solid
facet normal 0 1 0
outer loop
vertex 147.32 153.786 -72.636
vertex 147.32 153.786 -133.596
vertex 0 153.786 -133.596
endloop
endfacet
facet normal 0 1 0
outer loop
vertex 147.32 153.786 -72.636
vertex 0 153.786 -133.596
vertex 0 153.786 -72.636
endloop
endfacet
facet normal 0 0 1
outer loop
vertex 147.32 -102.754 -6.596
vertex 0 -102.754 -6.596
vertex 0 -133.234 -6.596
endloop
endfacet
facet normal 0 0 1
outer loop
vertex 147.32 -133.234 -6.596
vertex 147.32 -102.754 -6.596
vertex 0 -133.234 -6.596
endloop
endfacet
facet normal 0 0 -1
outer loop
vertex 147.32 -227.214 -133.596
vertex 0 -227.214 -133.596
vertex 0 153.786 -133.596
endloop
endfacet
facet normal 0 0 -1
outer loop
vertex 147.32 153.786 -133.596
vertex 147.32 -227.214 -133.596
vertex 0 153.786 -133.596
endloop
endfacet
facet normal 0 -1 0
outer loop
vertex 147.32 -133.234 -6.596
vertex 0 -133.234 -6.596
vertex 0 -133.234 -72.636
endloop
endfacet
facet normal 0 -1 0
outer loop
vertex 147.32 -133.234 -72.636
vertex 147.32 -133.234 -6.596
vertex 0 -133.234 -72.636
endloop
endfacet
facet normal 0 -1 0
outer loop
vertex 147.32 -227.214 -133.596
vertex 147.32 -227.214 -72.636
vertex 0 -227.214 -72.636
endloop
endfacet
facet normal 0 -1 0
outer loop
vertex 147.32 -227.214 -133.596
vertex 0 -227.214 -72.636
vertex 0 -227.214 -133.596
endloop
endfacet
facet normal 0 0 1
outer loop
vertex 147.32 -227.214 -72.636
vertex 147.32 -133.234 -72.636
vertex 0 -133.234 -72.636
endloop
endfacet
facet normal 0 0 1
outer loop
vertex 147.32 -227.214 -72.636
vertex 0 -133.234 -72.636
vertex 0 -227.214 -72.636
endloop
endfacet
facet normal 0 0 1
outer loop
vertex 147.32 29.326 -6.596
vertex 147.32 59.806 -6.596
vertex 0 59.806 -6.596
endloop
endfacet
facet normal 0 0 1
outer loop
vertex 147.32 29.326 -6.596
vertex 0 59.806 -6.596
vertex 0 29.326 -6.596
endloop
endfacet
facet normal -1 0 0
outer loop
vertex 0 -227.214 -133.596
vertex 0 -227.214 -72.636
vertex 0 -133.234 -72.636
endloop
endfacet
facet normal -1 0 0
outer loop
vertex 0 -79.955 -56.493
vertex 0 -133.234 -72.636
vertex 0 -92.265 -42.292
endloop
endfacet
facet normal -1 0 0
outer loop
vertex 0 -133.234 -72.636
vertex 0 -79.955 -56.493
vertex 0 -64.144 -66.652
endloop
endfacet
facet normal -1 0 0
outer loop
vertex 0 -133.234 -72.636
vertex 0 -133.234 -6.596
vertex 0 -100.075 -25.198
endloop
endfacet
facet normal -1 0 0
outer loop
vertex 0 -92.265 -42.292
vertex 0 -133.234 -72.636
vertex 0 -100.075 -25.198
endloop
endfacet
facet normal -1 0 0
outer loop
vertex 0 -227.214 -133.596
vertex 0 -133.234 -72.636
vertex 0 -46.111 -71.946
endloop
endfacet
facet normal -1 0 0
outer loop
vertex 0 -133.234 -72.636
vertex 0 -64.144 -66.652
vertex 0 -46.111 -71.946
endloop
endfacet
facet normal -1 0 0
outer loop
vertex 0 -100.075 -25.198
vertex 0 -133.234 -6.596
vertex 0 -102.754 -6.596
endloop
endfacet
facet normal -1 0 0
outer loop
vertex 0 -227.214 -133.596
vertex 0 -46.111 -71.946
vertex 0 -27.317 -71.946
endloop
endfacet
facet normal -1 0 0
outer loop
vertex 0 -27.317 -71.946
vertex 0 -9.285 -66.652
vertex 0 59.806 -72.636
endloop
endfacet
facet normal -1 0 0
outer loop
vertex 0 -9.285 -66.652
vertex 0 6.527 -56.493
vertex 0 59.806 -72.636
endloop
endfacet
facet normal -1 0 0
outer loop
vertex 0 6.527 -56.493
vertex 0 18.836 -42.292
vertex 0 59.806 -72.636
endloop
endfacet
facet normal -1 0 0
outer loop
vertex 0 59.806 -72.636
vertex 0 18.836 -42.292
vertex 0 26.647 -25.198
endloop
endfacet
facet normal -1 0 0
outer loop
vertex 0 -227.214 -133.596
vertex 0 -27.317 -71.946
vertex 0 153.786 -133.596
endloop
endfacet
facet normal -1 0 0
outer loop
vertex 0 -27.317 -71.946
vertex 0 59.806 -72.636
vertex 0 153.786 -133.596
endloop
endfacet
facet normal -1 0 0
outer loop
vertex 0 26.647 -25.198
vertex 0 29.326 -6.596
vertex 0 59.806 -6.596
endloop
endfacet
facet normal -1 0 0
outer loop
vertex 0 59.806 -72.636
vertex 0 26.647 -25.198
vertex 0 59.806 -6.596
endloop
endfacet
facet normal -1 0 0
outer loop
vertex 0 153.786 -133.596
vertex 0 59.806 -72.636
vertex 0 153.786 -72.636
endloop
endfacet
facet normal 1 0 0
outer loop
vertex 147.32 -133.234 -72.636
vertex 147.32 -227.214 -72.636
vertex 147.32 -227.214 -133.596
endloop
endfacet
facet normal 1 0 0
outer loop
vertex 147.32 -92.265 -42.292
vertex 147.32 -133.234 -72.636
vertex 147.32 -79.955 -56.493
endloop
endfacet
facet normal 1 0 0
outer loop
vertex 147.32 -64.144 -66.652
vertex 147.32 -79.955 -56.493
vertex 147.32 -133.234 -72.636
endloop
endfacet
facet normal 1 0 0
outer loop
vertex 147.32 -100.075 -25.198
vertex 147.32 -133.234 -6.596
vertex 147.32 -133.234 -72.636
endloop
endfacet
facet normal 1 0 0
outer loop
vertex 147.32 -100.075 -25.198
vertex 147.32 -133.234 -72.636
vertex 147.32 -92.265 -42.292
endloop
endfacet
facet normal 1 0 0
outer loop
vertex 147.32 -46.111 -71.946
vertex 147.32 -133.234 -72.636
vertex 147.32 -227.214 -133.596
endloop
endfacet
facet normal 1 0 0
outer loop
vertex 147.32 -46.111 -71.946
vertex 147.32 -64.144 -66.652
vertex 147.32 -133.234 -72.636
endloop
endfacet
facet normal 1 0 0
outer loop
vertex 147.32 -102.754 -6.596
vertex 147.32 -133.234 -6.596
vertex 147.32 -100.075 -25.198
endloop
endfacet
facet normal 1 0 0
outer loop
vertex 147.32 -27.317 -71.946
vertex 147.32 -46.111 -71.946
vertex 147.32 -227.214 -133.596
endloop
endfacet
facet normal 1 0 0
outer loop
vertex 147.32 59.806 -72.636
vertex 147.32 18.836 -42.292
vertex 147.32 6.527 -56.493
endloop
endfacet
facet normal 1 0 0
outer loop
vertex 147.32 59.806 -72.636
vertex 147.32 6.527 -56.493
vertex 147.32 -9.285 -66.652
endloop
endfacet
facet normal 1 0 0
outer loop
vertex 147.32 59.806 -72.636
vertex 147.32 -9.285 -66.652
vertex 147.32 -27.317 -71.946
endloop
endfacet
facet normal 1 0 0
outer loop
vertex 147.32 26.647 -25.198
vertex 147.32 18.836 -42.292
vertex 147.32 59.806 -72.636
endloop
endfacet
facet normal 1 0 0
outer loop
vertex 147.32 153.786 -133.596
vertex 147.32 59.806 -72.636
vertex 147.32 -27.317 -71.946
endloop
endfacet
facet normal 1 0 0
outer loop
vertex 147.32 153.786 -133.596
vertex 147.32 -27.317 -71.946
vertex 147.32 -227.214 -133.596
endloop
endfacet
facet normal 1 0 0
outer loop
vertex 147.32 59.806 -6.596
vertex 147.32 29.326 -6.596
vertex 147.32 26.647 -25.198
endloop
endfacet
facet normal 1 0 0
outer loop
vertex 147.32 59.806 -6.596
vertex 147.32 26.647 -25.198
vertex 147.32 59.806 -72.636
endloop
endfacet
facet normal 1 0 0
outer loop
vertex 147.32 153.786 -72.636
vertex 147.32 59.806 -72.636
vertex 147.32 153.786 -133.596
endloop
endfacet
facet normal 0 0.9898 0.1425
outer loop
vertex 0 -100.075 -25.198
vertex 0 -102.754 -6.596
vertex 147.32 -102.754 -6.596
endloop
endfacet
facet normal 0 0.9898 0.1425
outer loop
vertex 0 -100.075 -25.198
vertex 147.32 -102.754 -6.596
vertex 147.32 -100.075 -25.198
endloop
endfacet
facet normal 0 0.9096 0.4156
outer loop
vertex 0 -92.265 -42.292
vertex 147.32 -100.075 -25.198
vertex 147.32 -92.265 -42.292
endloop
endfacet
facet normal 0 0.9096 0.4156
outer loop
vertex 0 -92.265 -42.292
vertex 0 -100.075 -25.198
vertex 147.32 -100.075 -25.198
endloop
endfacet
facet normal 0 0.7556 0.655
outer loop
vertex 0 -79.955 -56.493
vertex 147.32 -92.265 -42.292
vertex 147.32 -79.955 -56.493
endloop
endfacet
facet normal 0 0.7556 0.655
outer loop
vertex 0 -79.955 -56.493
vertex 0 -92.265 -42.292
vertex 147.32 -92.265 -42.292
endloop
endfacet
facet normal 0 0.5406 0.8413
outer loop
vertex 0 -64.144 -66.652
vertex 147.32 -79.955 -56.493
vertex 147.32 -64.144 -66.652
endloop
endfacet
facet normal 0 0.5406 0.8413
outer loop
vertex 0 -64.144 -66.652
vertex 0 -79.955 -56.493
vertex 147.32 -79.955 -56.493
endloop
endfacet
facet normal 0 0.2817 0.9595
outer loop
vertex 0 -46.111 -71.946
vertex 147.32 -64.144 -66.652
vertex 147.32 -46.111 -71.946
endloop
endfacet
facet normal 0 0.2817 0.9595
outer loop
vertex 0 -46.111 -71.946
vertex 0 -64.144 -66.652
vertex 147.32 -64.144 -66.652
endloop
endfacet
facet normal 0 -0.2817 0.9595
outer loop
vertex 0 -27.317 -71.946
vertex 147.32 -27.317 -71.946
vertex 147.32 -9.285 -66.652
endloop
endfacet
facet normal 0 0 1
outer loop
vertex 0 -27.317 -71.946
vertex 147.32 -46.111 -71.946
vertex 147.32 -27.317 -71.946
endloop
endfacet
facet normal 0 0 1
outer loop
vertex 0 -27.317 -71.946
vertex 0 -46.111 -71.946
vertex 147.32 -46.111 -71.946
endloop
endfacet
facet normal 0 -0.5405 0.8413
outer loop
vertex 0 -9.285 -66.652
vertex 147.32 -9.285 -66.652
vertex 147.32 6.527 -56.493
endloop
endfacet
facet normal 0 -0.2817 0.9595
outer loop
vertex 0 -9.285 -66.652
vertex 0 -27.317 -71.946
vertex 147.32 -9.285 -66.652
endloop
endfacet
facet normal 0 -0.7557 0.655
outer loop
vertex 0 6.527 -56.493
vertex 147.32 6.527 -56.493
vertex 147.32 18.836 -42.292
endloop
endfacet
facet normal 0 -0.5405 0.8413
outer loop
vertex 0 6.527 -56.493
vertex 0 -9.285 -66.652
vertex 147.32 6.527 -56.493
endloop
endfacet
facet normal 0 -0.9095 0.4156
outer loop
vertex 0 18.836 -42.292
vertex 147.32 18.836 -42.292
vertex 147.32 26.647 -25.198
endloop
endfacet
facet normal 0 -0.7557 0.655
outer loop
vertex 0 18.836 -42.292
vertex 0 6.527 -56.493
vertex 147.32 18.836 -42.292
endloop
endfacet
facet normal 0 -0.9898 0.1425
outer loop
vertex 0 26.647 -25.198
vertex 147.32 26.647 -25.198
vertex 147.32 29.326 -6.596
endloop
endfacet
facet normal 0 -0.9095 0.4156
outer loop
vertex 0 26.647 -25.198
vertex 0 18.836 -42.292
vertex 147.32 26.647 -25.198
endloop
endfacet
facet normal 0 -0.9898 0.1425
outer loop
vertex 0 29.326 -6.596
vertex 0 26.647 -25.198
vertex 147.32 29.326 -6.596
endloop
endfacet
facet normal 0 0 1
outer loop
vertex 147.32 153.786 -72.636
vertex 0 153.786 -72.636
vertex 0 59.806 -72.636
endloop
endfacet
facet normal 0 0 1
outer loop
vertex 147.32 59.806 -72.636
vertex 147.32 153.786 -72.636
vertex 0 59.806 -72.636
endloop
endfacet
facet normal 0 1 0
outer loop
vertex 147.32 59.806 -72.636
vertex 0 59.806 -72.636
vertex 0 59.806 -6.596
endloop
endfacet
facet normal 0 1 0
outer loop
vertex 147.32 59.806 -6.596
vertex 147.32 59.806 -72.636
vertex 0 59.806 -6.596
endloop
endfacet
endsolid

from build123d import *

# Parameters (mm, degrees)
F2_DEPTH = 147.32
F3_DEPTH = 543
F1_R     = 66.04
F4_DEPTH = 147.321


# Not quite as in the source:
# - an extrude ends at something that could not be found from the text; its depth is read off the source's solid


with BuildPart() as f2:
    # F0 (on Right) → F2 (new body)
    with BuildSketch(Plane.YZ):
        Polygon((-227.214354679, -72.635721945), (-227.214354679, -133.595721945), (153.785645321, -133.595721945), (153.785645321, -72.635721945), (59.805645321, -72.635721945), (59.805645321, -6.595721945), (-3.4203693569, -6.595721945), (-97.4624507428, -6.595721945), (-133.234354679, -6.595721945), (-133.234354679, -72.635721945), align=None)
    extrude(amount=F2_DEPTH)

    # F1 (on face) → F3 (cut, through all)
    with BuildSketch(Plane.YZ):
        with BuildLine():
            ThreePointArc((29.3256430177, -6.595721945), (29.3256447452, -6.587001079), (29.325645321, -6.5782802129))
            ThreePointArc((29.325645321, -6.5782802129), (-36.7230755452, 59.4617192113), (-102.7543523758, -6.595721945))
            Line((-102.7543523758, -6.595721945), (-97.4624507428, -6.595721945))
            Line((-97.4624507428, -6.595721945), (-3.4203693569, -6.595721945))
            Line((-3.4203693569, -6.595721945), (29.3256430177, -6.595721945))
        make_face()
    extrude(amount=-F3_DEPTH, mode=Mode.SUBTRACT)

    # F1 (on face) + F2_face (on face) → F4 (cut, through all)
    with BuildSketch(Plane.YZ):
        with Locations((-36.714354679, -6.5782802129)):
            Circle(F1_R)
    with BuildSketch(Plane(origin=(147.32, -36.714354679, -80.6128525046), x_dir=(0, 1, 0), z_dir=(1, 0, 0))):
        Polygon((-190.5, 7.9771305595), (-190.5, -52.9828694405), (190.5, -52.9828694405), (190.5, 7.9771305595), (96.52, 7.9771305595), (96.52, 74.0171305595), (-96.52, 74.0171305595), (-96.52, 7.9771305595), align=None)
    extrude(amount=F4_DEPTH, mode=Mode.SUBTRACT)


solid = f2.part
